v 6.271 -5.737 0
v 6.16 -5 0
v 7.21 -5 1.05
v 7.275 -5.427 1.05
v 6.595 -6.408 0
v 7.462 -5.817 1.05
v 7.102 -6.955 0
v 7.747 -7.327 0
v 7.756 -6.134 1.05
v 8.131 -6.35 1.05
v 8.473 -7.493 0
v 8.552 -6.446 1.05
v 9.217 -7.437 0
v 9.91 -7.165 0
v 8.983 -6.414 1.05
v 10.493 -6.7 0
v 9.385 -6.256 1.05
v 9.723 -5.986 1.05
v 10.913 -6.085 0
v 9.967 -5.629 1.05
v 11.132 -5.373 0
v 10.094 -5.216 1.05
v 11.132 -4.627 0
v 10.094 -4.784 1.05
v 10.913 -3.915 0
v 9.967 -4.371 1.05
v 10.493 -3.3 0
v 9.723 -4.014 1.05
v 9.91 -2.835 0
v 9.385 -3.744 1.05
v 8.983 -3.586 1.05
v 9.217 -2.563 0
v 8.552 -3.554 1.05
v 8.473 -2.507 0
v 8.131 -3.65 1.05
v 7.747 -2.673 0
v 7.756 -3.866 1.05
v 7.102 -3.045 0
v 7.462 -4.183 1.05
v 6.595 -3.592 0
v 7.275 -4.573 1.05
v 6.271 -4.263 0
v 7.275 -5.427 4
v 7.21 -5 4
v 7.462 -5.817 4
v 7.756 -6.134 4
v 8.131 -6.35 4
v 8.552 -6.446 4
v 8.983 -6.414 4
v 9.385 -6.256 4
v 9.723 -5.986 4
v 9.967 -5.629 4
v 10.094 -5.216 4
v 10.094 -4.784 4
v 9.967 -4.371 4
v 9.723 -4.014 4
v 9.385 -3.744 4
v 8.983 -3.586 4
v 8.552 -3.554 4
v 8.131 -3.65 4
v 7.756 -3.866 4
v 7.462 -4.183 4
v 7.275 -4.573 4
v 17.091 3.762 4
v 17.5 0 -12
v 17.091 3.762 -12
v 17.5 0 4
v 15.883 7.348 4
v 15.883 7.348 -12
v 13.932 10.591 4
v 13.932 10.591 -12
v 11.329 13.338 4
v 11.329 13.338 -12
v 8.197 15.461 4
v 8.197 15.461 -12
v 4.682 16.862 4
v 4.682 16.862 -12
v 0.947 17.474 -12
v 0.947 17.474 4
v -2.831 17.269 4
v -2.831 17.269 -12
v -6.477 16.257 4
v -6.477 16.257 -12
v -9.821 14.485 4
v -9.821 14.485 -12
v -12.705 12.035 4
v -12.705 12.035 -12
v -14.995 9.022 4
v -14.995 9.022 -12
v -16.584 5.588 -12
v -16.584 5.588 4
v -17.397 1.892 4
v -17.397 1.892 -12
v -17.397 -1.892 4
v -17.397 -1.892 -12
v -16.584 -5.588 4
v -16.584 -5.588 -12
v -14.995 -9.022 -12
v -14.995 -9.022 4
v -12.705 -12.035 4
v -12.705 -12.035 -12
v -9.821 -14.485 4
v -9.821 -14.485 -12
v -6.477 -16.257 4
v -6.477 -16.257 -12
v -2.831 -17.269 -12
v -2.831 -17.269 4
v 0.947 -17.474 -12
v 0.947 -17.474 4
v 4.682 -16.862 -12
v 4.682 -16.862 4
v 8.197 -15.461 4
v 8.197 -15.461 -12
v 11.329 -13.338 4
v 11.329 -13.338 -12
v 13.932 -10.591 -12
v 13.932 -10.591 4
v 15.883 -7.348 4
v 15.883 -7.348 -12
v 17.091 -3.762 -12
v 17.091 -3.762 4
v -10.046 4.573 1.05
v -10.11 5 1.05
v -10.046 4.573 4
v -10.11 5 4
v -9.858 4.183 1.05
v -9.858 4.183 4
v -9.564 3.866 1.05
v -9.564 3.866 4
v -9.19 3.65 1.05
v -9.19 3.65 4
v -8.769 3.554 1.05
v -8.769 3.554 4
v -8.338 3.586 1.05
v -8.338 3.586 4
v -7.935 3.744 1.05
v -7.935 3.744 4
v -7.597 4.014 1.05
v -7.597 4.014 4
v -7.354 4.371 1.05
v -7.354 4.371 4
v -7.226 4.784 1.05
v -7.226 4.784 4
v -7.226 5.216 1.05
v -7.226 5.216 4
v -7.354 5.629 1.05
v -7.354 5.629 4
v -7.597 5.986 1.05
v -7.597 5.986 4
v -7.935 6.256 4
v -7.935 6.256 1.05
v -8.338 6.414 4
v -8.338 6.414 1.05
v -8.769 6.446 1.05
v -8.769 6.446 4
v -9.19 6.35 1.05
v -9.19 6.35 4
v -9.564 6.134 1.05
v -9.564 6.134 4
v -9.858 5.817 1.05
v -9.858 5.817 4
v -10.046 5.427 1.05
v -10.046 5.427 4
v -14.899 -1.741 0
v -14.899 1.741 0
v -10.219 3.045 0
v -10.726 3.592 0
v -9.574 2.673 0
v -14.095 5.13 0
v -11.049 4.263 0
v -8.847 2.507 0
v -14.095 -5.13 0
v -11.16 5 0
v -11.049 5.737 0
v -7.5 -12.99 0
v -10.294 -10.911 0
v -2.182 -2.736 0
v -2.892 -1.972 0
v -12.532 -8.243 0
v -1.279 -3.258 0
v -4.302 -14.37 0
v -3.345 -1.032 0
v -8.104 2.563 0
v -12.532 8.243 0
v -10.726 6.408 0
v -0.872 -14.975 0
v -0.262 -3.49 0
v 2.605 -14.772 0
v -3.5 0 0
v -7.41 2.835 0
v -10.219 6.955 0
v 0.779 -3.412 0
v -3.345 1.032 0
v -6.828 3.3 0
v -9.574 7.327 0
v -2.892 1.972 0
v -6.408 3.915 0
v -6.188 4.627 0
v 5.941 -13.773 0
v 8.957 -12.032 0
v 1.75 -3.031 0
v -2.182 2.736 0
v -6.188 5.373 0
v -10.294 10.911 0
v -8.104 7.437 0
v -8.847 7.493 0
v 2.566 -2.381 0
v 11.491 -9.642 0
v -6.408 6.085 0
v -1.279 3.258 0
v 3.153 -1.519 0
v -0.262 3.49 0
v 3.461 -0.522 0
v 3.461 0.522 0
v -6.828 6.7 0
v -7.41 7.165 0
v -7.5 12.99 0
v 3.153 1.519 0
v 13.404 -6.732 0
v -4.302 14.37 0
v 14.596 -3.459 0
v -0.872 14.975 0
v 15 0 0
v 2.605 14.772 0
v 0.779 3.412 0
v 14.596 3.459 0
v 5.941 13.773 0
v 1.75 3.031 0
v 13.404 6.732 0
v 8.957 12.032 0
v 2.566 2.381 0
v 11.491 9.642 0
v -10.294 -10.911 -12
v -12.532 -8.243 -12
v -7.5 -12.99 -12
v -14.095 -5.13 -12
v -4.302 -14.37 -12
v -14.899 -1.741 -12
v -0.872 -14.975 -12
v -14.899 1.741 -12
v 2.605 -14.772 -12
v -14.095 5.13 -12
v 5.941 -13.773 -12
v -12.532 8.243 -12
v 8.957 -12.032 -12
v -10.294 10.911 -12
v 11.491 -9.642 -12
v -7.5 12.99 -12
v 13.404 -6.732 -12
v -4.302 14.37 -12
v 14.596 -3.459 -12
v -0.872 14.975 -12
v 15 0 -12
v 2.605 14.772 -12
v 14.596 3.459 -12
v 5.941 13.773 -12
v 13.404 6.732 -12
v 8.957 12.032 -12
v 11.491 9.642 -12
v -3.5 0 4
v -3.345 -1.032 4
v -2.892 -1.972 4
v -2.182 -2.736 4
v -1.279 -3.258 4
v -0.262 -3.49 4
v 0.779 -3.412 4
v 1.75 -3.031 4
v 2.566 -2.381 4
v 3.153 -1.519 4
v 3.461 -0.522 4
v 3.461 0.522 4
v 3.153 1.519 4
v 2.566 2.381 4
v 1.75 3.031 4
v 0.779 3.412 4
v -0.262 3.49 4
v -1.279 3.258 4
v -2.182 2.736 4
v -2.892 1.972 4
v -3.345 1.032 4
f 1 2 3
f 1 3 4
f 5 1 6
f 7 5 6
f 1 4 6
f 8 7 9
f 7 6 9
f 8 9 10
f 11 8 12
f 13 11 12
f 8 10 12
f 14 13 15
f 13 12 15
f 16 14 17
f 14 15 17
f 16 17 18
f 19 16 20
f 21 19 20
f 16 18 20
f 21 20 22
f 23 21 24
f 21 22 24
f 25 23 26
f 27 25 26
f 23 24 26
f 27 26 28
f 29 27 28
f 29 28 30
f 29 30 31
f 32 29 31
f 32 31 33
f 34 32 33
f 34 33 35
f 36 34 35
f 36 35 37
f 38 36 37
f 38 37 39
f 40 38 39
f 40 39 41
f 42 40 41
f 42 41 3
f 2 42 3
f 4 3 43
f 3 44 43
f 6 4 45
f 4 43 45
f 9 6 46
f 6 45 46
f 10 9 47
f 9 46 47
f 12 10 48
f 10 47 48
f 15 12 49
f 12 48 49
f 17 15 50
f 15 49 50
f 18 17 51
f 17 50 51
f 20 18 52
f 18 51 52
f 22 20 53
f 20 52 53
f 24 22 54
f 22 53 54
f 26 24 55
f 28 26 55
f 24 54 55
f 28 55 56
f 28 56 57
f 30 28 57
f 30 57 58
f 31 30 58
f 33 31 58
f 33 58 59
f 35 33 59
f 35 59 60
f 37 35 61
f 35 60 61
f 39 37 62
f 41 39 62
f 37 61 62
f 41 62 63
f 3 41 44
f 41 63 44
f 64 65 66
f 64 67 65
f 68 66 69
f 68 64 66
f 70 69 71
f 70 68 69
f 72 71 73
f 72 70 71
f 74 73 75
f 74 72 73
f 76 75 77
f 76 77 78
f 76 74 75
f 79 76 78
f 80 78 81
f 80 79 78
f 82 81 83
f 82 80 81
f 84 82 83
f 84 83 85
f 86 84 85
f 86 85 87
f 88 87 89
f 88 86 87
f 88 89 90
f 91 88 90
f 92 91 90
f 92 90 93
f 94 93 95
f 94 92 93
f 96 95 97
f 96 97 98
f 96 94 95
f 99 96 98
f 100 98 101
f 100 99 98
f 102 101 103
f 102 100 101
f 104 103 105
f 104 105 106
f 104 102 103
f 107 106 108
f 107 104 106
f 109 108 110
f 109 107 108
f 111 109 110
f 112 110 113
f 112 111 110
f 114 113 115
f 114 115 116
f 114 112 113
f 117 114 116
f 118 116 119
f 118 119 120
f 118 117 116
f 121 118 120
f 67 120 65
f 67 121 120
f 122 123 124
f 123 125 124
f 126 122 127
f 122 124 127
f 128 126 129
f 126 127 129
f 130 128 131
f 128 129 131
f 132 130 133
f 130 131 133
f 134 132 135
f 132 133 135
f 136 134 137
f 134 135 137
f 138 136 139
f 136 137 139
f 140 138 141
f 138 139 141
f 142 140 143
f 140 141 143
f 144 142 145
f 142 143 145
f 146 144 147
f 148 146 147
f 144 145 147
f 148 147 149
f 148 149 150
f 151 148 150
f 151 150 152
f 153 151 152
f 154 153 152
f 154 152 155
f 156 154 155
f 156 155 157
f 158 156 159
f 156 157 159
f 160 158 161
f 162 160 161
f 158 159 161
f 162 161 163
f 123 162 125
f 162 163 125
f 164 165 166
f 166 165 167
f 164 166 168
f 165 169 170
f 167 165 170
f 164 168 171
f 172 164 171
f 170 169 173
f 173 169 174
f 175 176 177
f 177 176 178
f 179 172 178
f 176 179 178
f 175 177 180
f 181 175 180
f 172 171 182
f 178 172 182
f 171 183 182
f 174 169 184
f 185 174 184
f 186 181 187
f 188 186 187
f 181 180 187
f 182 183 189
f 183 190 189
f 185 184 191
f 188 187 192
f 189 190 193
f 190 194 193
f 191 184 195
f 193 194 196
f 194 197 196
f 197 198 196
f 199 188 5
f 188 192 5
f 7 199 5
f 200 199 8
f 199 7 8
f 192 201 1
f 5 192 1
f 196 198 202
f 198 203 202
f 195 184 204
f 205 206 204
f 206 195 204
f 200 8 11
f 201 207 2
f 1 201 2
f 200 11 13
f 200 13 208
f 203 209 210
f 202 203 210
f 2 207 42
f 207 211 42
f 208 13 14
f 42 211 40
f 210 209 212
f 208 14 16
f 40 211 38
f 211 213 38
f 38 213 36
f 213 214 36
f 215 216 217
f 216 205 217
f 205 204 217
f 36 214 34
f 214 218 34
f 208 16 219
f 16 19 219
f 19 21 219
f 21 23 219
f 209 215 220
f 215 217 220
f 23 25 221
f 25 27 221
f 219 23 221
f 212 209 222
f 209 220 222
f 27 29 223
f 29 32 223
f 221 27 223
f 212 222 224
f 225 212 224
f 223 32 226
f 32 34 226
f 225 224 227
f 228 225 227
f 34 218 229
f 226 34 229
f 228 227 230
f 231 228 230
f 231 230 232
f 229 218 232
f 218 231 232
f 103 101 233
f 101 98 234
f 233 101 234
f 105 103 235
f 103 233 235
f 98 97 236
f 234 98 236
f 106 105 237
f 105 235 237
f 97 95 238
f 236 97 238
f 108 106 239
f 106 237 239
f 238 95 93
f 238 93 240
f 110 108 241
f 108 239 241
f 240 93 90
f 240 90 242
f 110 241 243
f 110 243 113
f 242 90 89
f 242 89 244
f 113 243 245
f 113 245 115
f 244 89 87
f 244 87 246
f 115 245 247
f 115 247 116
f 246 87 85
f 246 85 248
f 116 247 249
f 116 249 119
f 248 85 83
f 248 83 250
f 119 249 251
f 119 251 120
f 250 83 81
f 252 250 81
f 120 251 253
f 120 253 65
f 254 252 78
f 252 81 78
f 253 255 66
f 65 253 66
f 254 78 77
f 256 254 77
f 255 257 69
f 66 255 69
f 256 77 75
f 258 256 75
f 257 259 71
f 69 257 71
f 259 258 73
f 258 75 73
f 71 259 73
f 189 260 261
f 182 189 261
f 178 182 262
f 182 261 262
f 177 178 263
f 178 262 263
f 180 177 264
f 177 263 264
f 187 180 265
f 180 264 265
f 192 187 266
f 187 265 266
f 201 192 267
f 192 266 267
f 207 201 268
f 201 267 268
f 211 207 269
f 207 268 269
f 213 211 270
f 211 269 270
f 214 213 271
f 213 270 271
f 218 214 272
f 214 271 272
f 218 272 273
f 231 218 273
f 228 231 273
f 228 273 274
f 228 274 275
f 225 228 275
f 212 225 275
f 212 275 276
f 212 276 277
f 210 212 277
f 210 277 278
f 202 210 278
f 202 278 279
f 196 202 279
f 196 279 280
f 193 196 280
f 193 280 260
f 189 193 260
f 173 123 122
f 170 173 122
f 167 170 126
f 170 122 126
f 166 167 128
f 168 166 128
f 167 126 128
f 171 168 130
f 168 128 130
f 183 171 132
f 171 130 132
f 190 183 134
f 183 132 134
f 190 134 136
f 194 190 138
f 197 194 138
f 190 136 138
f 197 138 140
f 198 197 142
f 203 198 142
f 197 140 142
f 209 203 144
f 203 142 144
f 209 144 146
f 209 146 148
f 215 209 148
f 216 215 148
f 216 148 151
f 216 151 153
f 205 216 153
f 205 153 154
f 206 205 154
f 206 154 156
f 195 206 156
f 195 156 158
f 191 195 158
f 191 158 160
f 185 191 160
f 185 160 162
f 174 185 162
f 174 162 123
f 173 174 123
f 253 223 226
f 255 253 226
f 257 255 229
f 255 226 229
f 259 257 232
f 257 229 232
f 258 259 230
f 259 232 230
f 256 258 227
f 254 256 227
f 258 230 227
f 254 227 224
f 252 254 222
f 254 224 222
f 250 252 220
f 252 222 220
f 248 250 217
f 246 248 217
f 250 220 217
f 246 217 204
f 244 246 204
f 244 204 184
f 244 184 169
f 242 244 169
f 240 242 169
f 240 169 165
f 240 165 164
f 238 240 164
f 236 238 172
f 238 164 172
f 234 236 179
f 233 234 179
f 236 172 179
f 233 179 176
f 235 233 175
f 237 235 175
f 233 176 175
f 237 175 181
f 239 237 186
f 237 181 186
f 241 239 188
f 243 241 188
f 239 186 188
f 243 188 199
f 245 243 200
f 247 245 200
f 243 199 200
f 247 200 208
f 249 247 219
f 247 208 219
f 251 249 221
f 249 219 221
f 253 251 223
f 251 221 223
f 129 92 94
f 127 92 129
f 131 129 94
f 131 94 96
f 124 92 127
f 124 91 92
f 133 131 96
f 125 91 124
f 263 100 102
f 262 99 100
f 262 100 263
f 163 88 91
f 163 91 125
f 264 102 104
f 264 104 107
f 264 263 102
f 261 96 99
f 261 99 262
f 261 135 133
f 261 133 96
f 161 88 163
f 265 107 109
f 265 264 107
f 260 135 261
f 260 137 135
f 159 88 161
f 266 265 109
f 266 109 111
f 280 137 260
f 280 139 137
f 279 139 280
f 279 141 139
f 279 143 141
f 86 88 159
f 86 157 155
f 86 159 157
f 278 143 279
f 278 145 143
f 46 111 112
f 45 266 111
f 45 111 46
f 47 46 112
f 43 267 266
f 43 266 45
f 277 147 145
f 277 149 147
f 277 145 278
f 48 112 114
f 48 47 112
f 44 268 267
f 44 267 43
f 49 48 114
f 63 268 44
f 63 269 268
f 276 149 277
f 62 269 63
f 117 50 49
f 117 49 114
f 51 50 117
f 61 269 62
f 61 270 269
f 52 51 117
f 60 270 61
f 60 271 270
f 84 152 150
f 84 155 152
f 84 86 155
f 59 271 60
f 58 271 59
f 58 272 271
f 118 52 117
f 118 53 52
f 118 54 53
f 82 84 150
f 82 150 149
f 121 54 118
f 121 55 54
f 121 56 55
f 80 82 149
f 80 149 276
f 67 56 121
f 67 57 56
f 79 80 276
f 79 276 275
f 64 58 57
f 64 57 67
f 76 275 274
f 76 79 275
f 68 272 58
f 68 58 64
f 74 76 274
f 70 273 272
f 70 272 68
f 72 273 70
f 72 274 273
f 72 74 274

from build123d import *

# Parameters (mm, degrees)
F0_R           = 17.5
F0_R_2         = 15
F1_DEPTH       = 4
F2_DEPTH       = 12
F3_D           = 2.9
F3_CSINK_D     = 5
F3_CSINK_ANGLE = 90
F4_D           = 7


# Not quite as in the source:
# - a feature names something its author has since deleted; it is built from what else it names


with BuildPart() as f1:
    # F0 (on Top) → F1 (new body)
    with BuildSketch(Plane.XY):
        Circle(F0_R)
        Circle(F0_R_2, mode=Mode.SUBTRACT)
        Circle(F0_R_2)
    extrude(amount=F1_DEPTH)

    # F0 (on Top) → F2 (join)
    with BuildSketch(Plane.XY):
        Circle(F0_R)
        Circle(F0_R_2, mode=Mode.SUBTRACT)
    extrude(amount=-F2_DEPTH)

    # F3 (through all)
    with Locations(Plane(origin=(0, 0, 0), x_dir=(1, 0, 0), z_dir=(0, 0, -1))):
        with Locations((8.6602540378, 5), (-8.6602540378, -5)):
            CounterSinkHole(F3_D / 2, F3_CSINK_D / 2, counter_sink_angle=F3_CSINK_ANGLE)

    # F4 (through all)
    with Locations(Plane(origin=(0, 0, 0), x_dir=(1, 0, 0), z_dir=(0, 0, -1))):
        with Locations((0, 0)):
            Hole(F4_D / 2)


solid = f1.part
